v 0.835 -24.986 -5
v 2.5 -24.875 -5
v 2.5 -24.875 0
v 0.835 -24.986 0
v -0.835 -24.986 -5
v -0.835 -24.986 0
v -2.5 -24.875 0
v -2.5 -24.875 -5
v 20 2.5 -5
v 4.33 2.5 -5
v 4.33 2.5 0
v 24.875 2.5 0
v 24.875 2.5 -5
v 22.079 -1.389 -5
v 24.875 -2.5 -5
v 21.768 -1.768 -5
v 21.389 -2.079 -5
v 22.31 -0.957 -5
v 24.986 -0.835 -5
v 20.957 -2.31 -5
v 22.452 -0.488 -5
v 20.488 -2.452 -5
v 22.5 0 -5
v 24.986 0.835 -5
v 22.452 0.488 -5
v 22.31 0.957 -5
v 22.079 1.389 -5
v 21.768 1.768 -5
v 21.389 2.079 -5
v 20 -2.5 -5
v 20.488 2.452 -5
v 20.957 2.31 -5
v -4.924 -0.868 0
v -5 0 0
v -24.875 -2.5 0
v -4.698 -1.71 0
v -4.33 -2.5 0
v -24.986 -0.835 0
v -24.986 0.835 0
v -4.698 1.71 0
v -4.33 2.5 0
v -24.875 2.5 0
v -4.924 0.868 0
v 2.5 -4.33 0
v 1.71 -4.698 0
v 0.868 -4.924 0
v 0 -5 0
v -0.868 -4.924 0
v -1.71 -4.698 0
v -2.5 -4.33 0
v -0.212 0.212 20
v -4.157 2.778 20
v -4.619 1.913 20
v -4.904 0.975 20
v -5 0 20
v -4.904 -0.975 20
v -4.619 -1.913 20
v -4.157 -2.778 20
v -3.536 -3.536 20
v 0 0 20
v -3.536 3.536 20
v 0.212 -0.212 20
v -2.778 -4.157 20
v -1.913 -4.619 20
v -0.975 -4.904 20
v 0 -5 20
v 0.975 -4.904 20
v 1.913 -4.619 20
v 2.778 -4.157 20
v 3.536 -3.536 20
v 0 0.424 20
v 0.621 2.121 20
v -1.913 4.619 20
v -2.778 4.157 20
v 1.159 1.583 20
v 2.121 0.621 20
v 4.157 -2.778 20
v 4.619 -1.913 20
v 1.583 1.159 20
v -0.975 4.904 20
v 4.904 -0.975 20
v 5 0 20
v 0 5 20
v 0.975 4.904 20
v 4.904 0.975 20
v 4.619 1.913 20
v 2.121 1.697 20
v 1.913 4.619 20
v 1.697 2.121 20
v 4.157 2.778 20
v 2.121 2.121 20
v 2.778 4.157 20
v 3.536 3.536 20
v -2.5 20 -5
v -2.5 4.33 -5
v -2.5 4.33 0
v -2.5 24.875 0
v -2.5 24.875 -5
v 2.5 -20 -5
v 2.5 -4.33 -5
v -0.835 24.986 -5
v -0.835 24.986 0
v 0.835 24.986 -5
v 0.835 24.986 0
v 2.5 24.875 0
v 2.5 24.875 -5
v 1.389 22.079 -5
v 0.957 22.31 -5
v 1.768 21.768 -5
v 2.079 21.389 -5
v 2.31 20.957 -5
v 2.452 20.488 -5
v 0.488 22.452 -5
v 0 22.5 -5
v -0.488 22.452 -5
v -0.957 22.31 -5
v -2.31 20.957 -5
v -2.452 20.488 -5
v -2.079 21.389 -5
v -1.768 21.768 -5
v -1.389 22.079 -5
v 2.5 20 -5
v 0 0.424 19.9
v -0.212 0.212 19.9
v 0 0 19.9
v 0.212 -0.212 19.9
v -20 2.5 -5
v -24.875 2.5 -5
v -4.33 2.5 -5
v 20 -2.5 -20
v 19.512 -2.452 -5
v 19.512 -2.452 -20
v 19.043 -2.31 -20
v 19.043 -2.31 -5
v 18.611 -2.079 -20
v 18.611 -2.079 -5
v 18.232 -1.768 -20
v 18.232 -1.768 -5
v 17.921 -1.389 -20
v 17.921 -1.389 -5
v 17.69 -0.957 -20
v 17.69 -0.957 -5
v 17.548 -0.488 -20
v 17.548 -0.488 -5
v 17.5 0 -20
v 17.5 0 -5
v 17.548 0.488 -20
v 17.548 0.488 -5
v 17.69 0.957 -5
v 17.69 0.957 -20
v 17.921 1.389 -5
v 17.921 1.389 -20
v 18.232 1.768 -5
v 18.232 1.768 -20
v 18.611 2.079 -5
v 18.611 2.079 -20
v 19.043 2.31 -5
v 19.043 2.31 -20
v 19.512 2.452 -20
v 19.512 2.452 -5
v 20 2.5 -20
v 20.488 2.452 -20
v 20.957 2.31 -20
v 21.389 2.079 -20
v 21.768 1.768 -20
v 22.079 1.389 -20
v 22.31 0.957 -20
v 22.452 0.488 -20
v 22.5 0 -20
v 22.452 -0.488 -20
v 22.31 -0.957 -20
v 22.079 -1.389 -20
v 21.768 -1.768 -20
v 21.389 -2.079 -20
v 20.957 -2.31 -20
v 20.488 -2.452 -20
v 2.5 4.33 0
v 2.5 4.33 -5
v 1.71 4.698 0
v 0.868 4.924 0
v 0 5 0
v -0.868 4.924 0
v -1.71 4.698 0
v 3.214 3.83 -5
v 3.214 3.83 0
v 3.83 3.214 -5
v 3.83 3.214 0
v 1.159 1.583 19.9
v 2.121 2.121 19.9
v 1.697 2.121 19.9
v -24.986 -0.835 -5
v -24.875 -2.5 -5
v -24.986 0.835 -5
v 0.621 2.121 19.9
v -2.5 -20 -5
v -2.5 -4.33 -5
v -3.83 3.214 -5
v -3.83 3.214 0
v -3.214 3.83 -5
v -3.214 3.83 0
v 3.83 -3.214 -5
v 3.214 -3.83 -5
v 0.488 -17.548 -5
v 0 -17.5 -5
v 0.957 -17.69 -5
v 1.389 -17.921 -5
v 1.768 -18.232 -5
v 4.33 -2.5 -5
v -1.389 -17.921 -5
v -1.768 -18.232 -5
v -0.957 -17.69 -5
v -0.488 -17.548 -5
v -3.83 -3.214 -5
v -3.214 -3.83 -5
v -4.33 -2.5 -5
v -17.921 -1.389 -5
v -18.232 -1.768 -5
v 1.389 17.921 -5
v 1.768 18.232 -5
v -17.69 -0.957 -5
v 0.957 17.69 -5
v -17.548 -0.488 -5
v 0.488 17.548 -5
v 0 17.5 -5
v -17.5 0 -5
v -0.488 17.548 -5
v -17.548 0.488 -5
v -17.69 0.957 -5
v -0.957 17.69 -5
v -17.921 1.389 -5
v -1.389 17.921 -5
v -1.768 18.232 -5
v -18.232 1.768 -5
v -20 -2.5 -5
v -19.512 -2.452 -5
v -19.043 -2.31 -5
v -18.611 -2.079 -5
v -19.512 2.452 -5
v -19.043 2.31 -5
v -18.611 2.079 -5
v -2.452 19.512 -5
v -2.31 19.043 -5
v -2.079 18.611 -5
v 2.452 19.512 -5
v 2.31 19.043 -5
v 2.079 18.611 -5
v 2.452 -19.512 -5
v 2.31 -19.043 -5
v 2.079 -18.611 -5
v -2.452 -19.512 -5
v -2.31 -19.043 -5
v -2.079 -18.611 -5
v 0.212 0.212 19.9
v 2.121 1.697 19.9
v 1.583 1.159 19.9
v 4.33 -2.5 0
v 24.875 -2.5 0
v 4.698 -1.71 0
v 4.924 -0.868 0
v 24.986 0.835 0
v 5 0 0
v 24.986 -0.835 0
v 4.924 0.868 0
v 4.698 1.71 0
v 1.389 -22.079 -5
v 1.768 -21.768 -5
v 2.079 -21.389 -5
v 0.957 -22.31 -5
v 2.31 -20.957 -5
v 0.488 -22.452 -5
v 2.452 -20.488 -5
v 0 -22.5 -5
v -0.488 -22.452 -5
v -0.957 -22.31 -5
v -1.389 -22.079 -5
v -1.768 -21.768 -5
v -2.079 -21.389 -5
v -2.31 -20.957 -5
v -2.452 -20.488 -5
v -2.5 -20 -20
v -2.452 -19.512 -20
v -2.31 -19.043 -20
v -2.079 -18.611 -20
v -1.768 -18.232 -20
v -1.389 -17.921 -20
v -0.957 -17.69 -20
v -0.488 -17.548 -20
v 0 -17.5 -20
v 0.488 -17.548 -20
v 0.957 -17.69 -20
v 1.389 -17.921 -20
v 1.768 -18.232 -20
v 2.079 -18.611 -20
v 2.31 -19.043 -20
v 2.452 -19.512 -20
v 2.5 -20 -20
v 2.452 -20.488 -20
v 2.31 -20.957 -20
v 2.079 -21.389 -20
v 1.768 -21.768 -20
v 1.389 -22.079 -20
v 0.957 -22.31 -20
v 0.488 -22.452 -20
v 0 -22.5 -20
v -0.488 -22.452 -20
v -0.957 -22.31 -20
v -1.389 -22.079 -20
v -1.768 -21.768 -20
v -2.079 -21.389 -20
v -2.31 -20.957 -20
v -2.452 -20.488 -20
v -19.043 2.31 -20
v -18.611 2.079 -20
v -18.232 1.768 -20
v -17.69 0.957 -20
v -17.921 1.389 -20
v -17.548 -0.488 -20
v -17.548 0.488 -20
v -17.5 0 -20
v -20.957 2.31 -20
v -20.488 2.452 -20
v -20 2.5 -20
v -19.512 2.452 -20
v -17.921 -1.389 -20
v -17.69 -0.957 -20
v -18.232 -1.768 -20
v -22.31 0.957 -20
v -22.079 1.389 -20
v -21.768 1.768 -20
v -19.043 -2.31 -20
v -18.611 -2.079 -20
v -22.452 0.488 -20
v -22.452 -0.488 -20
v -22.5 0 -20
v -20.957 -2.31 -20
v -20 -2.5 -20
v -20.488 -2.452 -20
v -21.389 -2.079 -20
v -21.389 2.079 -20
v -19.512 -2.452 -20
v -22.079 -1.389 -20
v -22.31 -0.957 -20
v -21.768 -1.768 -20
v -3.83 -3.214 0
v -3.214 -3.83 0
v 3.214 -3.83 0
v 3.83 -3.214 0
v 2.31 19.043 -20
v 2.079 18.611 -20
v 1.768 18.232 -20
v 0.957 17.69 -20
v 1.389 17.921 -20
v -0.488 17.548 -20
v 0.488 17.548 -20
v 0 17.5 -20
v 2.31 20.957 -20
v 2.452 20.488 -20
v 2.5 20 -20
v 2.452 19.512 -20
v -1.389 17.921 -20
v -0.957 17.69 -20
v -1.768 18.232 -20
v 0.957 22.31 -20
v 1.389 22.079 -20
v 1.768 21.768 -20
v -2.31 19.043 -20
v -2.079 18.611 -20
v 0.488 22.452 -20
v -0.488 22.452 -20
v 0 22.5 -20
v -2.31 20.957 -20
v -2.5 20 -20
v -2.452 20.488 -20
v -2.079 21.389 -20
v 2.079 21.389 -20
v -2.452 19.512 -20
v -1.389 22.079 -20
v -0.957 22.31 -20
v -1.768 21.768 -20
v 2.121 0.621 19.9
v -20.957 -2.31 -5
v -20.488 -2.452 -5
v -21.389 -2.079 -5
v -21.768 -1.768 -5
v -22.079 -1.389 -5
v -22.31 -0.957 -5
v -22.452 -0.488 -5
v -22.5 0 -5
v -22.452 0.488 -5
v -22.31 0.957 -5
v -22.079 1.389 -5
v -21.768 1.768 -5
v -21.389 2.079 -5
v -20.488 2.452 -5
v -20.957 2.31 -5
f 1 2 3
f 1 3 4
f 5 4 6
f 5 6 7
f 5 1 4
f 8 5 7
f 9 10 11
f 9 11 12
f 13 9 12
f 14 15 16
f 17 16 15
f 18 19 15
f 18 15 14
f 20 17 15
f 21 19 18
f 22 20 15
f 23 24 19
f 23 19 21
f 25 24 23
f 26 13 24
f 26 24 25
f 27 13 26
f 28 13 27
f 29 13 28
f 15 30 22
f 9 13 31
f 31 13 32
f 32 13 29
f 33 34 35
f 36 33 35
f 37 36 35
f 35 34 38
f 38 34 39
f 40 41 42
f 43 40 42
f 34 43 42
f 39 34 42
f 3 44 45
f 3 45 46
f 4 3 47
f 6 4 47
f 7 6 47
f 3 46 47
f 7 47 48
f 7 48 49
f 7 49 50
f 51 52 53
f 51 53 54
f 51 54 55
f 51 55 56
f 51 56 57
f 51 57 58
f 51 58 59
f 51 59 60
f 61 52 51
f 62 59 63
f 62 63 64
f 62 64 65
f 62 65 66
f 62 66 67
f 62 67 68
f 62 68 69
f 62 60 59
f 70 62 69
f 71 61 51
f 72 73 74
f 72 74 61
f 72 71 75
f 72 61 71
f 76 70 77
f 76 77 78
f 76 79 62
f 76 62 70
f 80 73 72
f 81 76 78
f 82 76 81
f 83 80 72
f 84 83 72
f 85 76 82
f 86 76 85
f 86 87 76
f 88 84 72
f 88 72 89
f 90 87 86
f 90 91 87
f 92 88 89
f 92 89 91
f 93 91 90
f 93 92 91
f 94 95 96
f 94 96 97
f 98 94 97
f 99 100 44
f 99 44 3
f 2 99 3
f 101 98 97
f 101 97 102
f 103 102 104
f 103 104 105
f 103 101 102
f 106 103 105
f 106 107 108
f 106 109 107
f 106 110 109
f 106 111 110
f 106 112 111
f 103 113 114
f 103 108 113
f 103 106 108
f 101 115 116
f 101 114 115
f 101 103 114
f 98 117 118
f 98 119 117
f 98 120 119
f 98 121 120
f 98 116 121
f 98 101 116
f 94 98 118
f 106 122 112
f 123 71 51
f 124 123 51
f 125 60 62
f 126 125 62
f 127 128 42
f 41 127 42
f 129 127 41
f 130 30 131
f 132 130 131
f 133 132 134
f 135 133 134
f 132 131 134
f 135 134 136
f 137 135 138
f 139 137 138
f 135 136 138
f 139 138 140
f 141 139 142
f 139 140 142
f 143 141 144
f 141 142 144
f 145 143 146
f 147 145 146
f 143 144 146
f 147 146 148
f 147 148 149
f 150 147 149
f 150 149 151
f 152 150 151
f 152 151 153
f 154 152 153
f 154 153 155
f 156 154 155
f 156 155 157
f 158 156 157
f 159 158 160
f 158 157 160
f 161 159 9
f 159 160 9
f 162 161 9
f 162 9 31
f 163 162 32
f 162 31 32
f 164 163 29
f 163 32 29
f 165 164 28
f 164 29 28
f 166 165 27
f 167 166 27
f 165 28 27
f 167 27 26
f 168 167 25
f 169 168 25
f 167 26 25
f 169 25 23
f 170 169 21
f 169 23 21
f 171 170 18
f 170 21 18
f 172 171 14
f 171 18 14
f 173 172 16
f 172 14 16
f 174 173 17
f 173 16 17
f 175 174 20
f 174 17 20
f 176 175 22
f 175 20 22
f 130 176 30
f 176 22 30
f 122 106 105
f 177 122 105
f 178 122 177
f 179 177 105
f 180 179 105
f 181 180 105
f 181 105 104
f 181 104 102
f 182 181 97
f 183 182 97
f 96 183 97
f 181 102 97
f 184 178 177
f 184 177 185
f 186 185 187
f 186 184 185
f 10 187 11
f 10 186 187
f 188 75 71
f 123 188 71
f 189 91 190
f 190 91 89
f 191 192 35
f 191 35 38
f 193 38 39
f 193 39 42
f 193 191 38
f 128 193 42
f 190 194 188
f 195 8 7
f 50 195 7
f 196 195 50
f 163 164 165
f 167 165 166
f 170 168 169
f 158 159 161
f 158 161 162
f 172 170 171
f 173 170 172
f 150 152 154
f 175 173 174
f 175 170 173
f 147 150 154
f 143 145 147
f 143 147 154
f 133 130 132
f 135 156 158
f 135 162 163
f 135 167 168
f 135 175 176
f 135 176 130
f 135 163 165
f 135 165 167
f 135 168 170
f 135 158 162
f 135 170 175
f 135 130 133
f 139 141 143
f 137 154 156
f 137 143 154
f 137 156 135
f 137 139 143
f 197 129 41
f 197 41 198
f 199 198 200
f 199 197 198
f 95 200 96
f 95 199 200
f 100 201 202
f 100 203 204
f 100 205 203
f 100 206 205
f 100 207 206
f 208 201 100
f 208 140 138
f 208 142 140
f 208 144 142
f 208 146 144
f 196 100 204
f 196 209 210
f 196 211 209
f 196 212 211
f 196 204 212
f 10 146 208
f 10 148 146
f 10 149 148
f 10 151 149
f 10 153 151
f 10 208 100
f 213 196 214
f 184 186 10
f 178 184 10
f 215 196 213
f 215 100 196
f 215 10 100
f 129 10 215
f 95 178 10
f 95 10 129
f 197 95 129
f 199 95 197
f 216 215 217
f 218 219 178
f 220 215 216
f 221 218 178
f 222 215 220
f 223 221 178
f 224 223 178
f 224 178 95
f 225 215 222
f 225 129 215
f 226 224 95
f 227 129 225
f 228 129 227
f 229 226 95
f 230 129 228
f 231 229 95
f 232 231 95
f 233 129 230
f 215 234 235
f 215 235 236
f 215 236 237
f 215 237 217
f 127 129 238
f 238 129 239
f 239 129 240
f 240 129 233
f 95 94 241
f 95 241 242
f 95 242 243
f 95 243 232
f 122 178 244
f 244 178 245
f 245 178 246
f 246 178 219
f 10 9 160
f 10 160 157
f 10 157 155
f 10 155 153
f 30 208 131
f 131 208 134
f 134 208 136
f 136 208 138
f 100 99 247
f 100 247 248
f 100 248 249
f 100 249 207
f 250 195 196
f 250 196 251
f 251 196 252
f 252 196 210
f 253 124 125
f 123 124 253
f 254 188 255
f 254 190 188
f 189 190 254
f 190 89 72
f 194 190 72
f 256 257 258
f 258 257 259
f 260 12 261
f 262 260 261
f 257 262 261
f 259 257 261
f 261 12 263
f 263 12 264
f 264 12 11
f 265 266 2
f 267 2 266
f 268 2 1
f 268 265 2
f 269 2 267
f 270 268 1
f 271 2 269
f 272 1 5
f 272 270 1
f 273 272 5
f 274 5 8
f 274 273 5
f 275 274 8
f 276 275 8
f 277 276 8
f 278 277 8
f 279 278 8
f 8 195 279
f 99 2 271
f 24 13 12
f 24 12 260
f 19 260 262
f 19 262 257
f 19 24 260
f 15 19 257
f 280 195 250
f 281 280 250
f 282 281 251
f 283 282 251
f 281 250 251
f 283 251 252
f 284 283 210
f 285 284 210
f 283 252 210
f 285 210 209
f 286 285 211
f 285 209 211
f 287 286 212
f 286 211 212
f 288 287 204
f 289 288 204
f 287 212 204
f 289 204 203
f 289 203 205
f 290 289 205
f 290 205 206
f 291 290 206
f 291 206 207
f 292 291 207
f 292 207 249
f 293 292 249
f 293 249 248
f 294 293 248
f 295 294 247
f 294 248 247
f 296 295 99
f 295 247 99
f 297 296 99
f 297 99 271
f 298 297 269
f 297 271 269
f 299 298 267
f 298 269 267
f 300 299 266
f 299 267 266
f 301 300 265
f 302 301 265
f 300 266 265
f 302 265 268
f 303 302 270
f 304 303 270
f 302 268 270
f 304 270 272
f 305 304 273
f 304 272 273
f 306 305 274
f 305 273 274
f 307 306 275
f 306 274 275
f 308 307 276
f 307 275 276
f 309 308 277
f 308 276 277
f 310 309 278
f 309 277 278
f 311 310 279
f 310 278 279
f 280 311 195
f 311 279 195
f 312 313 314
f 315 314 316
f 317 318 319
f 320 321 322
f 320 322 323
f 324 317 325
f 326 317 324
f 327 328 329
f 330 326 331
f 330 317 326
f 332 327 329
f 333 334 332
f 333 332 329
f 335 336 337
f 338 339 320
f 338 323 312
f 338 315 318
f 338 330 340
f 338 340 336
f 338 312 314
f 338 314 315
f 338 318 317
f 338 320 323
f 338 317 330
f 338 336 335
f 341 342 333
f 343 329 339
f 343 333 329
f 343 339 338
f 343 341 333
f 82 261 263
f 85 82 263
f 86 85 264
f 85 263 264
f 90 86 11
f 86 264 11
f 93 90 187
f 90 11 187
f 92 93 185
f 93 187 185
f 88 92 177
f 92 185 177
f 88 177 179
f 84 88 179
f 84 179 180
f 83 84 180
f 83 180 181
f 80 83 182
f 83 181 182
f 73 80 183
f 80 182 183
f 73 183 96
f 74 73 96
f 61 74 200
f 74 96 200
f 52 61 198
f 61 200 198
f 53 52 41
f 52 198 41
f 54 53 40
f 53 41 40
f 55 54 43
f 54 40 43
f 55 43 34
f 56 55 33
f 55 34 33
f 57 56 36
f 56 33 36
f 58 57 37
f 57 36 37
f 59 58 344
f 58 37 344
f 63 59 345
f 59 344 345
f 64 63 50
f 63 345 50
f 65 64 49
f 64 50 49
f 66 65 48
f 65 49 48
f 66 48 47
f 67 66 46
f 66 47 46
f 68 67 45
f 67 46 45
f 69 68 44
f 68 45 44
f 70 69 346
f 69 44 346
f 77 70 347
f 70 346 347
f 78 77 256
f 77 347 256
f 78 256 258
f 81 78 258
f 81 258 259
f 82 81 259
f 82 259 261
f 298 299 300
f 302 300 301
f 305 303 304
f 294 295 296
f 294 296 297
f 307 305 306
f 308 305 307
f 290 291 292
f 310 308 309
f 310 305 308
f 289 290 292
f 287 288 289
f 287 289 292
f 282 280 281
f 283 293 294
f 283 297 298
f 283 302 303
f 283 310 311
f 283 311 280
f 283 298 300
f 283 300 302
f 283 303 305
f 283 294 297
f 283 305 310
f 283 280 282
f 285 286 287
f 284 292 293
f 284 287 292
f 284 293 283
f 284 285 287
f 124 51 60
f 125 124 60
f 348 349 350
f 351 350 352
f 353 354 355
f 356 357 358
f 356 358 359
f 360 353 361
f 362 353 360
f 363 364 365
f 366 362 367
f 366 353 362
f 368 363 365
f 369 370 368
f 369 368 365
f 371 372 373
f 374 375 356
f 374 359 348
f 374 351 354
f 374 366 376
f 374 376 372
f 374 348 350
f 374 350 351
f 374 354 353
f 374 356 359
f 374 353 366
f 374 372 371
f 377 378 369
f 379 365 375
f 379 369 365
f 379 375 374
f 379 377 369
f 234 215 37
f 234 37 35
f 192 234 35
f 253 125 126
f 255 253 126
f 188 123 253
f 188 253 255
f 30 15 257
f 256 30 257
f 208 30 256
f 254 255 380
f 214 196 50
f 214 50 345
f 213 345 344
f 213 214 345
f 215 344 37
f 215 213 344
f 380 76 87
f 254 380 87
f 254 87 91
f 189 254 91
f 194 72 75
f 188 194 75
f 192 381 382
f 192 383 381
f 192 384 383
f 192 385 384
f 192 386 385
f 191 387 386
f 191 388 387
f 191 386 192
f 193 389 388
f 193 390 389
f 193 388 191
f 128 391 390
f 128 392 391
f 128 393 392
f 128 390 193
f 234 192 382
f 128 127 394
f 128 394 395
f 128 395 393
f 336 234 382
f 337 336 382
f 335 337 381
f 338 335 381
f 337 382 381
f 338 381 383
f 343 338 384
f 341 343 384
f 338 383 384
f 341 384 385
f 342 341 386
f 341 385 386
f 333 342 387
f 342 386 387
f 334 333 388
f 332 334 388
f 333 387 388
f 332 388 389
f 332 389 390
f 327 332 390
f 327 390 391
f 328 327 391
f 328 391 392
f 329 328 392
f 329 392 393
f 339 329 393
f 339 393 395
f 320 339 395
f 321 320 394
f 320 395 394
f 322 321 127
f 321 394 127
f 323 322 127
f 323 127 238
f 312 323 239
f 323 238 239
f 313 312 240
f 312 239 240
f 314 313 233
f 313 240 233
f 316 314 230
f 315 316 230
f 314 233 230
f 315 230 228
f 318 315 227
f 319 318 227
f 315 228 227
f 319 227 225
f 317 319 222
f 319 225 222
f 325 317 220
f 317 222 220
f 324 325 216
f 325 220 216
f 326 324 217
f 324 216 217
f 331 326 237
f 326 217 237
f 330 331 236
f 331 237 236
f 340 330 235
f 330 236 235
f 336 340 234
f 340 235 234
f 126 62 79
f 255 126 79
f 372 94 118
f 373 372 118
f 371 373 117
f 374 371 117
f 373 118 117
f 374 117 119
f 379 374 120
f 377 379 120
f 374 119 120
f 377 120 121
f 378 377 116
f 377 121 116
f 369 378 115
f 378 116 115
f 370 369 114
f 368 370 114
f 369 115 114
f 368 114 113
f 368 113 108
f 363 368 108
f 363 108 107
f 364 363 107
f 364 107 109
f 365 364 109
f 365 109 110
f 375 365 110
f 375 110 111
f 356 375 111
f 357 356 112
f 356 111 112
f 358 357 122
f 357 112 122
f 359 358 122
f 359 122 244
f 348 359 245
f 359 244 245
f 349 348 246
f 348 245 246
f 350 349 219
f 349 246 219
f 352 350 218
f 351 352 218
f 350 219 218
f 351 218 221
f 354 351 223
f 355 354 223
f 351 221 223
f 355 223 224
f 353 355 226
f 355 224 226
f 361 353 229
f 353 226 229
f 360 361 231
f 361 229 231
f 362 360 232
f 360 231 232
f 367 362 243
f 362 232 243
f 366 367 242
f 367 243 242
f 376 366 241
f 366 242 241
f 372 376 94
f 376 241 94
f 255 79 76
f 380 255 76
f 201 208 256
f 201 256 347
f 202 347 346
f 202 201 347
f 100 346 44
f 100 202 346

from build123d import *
from build123d.topology import SkipClean

# Parameters (mm, degrees)
SKETCH1_R           = 5
BOSS_EXTRUDE1_DEPTH = 20
BOSS_EXTRUDE3_START = 5
BOSS_EXTRUDE3_DEPTH = 5
SKETCH3_R           = 2.5
BOSS_EXTRUDE4_DEPTH = 15
CUT_EXTRUDE2_DEPTH  = 0.1


with BuildPart() as part:
    # Sketch1 → Boss-Extrude1 (new body)
    with BuildSketch(Plane.XY):
        Circle(SKETCH1_R)
    extrude(amount=BOSS_EXTRUDE1_DEPTH)

    # Sketch2 → Boss-Extrude3 (add)
    with SkipClean():  # the faces are left unmerged after this step: merging them gives an invalid solid
        with BuildSketch(Plane(origin=(0, 0, 0), x_dir=(-1, 0, 0), z_dir=(0, 0, -1)).offset(BOSS_EXTRUDE3_START)):
            with BuildLine():
                ThreePointArc((24.874685928, -2.5), (25, 0), (24.874685928, 2.5))
                Line((24.874685928, 2.5), (4.330127019, 2.5))
                ThreePointArc((4.330127019, 2.5), (3.535533906, 3.535533906), (2.5, 4.330127019))
                Line((2.5, 4.330127019), (2.5, 24.874685928))
                ThreePointArc((2.5, 24.874685928), (0, 25), (-2.5, 24.874685928))
                Line((-2.5, 24.874685928), (-2.5, 4.330127019))
                ThreePointArc((-2.5, 4.330127019), (-3.535533906, 3.535533906), (-4.330127019, 2.5))
                Line((-4.330127019, 2.5), (-24.874685928, 2.5))
                ThreePointArc((-24.874685928, 2.5), (-25, 0), (-24.874685928, -2.5))
                Line((-24.874685928, -2.5), (-4.330127019, -2.5))
                ThreePointArc((-4.330127019, -2.5), (-3.535533906, -3.535533906), (-2.5, -4.330127019))
                Line((-2.5, -4.330127019), (-2.5, -24.874685928))
                ThreePointArc((-2.5, -24.874685928), (0, -25), (2.5, -24.874685928))
                Line((2.5, -24.874685928), (2.5, -4.330127019))
                ThreePointArc((2.5, -4.330127019), (3.535533906, -3.535533906), (4.330127019, -2.5))
                Line((4.330127019, -2.5), (24.874685928, -2.5))
            make_face()
        extrude(amount=-BOSS_EXTRUDE3_DEPTH)

    # Sketch3 → Boss-Extrude4 (add)
    with SkipClean():  # the faces are left unmerged after this step: merging them gives an invalid solid
        with BuildSketch(Plane(origin=(0, 0, -5), x_dir=(-1, 0, 0), z_dir=(0, 0, -1))):
            with Locations(Location((-20, 0, 0), (0, 0, 270))):
                Circle(SKETCH3_R)
            with Locations((0, 20)):
                Circle(SKETCH3_R)
            with Locations(Location((20, 0, 0), (0, 0, 270))):
                Circle(SKETCH3_R)
            with Locations((0, -20)):
                Circle(SKETCH3_R)
        extrude(amount=BOSS_EXTRUDE4_DEPTH)

    # Sketch4 → Cut-Extrude2 (cut)
    with SkipClean():  # the faces are left unmerged after this step: merging them gives an invalid solid
        with BuildSketch(Plane.XY.offset(20)):
            Polygon((0.621320344, 2.121320344), (1.159188309, 1.583452378), (1.697056275, 2.121320344), align=None)
            Polygon((1.159188309, 1.583452378), (1.583452378, 1.159188309), (2.121320344, 1.697056275), (2.121320344, 2.121320344), (1.697056275, 2.121320344), align=None)
            Polygon((2.121320344, 1.697056275), (1.583452378, 1.159188309), (2.121320344, 0.621320344), align=None)
            Polygon((0.212132034, 0.212132034), (0, 0), (0.212132034, -0.212132034), (1.583452378, 1.159188309), (1.159188309, 1.583452378), (0, 0.424264069), align=None)
            Polygon((-0.212132034, 0.212132034), (0, 0), (0.212132034, 0.212132034), (0, 0.424264069), align=None)
        extrude(amount=-CUT_EXTRUDE2_DEPTH, mode=Mode.SUBTRACT)


solid = part.part
